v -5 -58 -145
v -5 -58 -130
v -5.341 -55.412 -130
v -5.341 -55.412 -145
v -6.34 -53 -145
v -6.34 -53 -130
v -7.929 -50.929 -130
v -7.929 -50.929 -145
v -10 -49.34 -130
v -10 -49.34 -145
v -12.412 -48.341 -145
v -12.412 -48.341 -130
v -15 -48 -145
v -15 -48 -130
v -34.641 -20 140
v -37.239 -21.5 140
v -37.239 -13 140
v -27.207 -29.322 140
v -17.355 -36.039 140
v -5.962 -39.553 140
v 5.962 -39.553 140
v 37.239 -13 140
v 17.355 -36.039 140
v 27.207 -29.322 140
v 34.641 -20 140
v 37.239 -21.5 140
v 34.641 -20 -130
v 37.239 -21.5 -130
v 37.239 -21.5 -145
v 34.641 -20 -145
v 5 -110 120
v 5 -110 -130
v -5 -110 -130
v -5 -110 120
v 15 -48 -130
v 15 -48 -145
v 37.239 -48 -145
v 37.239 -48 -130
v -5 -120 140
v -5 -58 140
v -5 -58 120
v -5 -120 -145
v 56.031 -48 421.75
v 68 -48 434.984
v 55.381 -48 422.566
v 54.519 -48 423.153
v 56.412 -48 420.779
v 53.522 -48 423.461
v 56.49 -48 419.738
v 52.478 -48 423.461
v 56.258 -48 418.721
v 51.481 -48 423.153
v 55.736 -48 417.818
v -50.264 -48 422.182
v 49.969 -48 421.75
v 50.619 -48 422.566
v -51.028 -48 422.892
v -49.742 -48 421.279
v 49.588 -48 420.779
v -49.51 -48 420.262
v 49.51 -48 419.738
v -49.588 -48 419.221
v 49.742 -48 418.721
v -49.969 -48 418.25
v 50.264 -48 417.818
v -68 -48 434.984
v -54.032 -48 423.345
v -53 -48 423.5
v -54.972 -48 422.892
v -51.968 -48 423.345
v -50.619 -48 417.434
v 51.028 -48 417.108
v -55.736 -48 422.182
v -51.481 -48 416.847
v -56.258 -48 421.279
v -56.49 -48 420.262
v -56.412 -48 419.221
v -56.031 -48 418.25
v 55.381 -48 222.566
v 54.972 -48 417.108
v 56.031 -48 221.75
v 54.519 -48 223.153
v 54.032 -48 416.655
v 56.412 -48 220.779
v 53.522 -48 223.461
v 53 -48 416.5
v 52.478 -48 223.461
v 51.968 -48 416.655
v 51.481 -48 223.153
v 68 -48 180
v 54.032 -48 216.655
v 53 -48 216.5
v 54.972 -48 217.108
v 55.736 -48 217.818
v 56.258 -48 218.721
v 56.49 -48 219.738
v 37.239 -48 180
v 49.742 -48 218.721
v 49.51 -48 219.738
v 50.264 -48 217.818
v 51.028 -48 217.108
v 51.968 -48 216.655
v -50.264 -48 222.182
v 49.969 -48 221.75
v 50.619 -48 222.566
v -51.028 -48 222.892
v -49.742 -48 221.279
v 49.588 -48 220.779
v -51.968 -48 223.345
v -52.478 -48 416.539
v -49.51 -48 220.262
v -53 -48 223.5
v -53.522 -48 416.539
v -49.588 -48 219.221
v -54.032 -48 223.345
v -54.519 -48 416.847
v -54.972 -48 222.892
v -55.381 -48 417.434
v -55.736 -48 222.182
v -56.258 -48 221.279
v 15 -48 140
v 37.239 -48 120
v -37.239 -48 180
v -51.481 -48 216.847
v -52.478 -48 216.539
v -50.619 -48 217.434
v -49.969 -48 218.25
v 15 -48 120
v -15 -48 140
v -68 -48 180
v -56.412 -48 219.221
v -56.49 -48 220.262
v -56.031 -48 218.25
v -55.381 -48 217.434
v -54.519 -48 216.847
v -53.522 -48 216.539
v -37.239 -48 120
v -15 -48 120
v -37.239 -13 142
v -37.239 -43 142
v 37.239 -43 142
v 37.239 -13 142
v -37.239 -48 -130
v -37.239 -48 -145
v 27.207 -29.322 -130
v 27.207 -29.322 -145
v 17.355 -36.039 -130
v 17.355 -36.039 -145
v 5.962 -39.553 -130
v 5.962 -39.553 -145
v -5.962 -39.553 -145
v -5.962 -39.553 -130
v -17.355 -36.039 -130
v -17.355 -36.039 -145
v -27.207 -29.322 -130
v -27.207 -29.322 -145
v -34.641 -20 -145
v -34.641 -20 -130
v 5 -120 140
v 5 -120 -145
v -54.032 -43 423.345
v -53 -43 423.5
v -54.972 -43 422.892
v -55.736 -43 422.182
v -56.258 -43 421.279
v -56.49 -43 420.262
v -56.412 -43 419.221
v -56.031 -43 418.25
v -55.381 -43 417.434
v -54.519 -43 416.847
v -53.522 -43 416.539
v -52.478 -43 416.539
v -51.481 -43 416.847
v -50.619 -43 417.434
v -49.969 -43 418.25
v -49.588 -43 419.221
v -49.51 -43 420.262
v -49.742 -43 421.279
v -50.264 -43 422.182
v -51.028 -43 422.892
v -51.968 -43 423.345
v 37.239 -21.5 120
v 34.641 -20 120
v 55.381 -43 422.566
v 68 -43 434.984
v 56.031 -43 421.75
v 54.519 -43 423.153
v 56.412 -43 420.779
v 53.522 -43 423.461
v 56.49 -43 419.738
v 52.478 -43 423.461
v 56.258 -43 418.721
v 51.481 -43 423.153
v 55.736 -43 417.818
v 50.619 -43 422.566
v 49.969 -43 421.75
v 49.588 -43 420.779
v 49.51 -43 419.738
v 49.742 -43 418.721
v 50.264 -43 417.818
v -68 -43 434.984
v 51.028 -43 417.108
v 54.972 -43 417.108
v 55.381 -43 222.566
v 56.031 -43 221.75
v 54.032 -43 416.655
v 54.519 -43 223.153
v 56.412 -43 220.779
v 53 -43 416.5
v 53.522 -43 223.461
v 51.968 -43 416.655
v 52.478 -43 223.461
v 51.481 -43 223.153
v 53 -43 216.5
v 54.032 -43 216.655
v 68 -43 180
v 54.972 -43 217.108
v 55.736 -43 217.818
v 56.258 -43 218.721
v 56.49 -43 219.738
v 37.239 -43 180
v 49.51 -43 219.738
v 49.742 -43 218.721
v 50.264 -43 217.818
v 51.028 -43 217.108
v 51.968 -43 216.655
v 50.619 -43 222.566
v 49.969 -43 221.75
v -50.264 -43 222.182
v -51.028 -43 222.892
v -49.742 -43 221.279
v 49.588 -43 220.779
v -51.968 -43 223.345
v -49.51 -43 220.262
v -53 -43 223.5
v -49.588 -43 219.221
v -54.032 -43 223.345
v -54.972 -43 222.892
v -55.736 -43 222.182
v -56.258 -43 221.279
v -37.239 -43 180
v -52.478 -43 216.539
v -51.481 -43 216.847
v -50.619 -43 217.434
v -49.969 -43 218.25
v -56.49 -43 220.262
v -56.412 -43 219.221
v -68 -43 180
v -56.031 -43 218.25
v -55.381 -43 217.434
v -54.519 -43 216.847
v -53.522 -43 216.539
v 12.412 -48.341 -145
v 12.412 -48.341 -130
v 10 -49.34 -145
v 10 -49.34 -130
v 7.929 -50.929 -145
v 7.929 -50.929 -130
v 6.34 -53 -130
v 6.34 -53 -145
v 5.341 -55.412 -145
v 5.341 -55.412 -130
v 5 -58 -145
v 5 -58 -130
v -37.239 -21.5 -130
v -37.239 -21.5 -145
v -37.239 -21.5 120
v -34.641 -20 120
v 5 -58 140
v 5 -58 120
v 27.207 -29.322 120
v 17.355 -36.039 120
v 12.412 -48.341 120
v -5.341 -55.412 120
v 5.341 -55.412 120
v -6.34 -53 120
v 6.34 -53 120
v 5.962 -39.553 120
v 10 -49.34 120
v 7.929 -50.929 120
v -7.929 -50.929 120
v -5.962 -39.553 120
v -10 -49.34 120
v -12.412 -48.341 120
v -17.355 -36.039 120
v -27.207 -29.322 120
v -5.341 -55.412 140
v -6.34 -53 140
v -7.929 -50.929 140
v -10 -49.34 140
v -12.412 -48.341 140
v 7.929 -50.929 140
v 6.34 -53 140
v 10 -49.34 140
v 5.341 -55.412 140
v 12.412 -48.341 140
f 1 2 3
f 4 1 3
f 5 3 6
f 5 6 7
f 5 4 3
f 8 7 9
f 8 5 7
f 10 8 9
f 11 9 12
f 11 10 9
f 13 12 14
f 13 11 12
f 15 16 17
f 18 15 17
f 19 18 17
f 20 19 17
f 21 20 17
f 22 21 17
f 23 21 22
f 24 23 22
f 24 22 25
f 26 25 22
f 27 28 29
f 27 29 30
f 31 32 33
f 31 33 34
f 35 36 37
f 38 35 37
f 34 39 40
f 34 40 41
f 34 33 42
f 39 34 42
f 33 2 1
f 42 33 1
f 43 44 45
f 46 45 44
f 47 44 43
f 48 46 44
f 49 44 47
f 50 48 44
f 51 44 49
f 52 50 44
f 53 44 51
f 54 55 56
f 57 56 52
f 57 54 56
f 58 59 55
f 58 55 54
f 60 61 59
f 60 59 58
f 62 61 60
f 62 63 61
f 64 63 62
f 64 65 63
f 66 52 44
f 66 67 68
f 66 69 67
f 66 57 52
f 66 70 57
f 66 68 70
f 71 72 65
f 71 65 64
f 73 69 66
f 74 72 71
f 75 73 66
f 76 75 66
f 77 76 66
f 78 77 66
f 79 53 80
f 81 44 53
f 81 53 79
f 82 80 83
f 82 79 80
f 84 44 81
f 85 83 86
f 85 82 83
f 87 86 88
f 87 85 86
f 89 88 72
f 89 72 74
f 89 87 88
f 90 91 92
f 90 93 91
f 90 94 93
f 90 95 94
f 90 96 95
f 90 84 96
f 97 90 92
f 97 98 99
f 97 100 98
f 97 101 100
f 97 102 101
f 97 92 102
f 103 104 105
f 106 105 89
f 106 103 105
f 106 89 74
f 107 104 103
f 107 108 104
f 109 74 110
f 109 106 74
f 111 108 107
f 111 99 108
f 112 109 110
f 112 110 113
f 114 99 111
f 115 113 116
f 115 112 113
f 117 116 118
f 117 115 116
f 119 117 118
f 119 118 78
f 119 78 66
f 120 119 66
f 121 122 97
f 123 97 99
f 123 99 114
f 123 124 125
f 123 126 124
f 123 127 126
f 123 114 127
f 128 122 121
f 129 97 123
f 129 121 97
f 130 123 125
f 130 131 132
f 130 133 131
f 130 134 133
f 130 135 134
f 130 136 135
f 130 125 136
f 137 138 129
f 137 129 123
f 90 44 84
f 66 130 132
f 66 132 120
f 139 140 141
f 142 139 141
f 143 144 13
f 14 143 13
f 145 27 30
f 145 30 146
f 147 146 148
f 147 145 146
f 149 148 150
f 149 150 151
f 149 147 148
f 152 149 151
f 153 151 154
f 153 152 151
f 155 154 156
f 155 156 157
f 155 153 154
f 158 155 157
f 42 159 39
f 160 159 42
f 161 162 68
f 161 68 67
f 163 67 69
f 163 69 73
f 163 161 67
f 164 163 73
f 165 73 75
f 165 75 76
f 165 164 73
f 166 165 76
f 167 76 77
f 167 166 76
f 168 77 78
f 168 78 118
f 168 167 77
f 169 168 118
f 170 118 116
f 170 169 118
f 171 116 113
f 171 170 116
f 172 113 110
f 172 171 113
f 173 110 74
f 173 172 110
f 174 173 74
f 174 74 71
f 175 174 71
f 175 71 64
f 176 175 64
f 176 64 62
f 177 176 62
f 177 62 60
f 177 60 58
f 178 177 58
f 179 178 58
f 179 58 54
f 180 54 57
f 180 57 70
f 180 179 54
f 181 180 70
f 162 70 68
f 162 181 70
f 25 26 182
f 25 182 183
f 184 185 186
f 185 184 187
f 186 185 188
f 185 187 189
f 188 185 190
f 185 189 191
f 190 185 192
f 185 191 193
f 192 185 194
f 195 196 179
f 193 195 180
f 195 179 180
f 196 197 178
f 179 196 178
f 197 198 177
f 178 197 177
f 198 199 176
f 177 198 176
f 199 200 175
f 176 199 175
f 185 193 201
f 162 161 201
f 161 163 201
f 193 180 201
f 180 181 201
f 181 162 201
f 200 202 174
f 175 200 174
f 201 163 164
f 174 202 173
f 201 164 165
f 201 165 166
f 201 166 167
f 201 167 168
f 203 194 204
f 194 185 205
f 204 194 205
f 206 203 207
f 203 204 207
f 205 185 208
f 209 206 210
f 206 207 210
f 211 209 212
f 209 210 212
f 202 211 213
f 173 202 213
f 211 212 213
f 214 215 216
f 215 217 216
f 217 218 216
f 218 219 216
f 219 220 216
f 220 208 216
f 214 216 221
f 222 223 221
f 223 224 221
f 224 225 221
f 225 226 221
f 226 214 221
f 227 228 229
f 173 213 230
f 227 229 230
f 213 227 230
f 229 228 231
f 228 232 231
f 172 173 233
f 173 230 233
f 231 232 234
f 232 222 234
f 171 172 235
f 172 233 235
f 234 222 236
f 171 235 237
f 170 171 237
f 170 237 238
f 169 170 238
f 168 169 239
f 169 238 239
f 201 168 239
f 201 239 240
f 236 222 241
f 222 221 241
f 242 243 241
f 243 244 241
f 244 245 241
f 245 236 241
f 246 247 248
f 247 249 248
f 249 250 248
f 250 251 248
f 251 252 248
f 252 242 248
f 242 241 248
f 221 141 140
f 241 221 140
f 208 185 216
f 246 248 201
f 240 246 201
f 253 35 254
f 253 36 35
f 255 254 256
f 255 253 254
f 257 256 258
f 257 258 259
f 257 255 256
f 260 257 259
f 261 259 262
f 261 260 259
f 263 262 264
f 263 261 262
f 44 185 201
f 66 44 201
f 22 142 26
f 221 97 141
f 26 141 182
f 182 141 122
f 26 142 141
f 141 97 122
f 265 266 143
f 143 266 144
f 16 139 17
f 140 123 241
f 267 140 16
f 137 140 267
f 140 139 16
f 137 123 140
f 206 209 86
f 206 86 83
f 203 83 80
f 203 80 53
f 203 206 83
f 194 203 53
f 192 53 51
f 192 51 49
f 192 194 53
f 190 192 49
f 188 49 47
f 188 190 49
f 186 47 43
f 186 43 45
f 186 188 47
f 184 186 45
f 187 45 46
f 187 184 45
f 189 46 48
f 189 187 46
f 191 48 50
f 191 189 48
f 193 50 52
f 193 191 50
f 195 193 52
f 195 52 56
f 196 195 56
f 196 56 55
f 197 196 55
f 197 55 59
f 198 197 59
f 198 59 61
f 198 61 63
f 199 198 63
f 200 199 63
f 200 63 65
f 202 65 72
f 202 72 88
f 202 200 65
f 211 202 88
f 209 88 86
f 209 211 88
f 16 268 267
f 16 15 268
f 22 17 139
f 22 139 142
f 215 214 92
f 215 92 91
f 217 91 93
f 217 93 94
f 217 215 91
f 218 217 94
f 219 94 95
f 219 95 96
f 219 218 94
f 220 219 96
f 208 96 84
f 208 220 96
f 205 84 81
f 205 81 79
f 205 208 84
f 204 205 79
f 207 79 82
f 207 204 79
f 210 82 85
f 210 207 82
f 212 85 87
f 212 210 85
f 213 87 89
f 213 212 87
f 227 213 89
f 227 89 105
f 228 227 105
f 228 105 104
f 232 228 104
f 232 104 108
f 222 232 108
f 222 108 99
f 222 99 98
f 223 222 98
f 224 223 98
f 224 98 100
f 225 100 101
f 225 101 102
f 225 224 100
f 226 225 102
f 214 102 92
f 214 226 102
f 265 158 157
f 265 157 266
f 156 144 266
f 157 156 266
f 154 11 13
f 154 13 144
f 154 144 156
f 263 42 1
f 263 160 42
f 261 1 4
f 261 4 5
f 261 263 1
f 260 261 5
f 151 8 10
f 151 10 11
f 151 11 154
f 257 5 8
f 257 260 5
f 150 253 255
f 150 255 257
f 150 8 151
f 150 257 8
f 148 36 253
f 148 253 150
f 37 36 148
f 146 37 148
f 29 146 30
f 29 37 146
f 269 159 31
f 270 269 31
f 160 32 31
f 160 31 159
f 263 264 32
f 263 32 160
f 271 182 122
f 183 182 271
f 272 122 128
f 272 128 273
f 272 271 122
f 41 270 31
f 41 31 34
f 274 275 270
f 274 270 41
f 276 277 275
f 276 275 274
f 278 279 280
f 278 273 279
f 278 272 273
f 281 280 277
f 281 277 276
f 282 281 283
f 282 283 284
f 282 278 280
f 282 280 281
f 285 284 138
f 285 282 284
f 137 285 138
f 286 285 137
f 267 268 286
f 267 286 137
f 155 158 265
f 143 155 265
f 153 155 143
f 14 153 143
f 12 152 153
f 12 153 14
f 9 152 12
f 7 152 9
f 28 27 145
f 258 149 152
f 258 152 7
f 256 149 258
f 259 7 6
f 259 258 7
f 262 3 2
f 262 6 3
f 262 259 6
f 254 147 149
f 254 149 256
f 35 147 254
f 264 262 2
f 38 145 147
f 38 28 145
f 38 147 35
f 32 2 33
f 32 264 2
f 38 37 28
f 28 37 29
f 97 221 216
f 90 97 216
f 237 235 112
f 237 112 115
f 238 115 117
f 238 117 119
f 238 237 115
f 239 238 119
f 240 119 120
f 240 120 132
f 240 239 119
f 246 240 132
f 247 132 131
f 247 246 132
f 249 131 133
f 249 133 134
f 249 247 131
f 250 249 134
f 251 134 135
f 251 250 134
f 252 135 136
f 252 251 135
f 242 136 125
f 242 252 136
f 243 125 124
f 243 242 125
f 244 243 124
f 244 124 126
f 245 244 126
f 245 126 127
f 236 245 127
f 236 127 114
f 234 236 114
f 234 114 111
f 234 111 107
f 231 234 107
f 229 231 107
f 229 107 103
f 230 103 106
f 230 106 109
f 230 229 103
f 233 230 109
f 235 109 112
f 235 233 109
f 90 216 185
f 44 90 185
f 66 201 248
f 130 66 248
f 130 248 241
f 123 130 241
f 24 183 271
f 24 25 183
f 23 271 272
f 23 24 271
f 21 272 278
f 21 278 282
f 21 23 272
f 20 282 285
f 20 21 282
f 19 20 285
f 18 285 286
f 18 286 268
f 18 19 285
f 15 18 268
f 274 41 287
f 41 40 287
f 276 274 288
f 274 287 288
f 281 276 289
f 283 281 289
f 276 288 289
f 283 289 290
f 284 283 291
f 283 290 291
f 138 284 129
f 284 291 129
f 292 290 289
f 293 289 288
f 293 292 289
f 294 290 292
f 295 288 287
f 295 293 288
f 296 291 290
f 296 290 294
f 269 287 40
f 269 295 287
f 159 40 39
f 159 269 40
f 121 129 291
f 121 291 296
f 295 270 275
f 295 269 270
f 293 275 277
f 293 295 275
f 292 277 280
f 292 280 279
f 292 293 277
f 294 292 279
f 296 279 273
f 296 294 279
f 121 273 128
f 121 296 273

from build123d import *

# Parameters (mm, degrees)
EXTRUDE_START    = 130
EXTRUDE_1_DEPTH  = 10
EXTRUDE_START_2  = -130
EXTRUDE_2_DEPTH  = 15
SKETCH_2_R       = 3.5
EXTRUDE_5_DEPTH  = 5
EXTRUDE_START_3  = -20
EXTRUDE_11_DEPTH = 20
EXTRUDE_15_DEPTH = 15
EXTRUDE_16_DEPTH = 5
FILLET_1_R       = 10
SKETCH_9_W       = 74.478184726
SKETCH_9_H       = 2
EXTRUDE_17_DEPTH = 30


with BuildPart() as part:
    # 草图1 → 凸台-拉伸1 (new, symmetric)
    with BuildSketch(Plane.XY.offset(EXTRUDE_START)):
        with BuildLine():
            Line((-34.641016151, -20), (-37.239092363, -21.5))
            ThreePointArc((-37.239092363, -21.5), (0, -43), (37.239092363, -21.5))
            Line((37.239092363, -21.5), (34.641016151, -20))
            ThreePointArc((34.641016151, -20), (0, -40), (-34.641016151, -20))
        make_face()
    extrude(amount=EXTRUDE_1_DEPTH, both=True)



with BuildPart() as body_2:
    # 草图1<2> → 凸台-拉伸2 (new body)
    with BuildSketch(Plane.XY.offset(EXTRUDE_START_2)):
        with BuildLine():
            Line((-34.641016151, -20), (-37.239092363, -21.5))
            ThreePointArc((-37.239092363, -21.5), (0, -43), (37.239092363, -21.5))
            Line((37.239092363, -21.5), (34.641016151, -20))
            ThreePointArc((34.641016151, -20), (0, -40), (-34.641016151, -20))
        make_face()
    extrude(amount=-EXTRUDE_2_DEPTH)

    # 草图7 → 凸台-拉伸15 (add)
    with BuildSketch(Plane(origin=(0, 0, -145), x_dir=(-1, 0, 0), z_dir=(0, 0, -1))):
        with BuildLine():
            Line((37.239092363, -21.5), (37.239092363, -48))
            Line((37.239092363, -48), (-37.239092363, -48))
            Line((-37.239092363, -48), (-37.239092363, -21.5))
            ThreePointArc((-37.239092363, -21.5), (0, -43), (37.239092363, -21.5))
        make_face()
    extrude(amount=-EXTRUDE_15_DEPTH)


with BuildPart() as body_3:
    # 草图2 → 凸台-拉伸5 (new body)
    with BuildSketch(Plane(origin=(0, -43, 0), x_dir=(-1, 0, 0), z_dir=(0, -1, 0))):
        Polygon((-37.239092363, -180), (-68, -180), (-68, -434.984182396), (68, -434.984182396), (68, -180), (37.239092363, -180), (37.239092363, -120), (-37.239092363, -120), align=None)
        with Locations(Location((-53, -220, 0), (0, 0, 90))):
            Circle(SKETCH_2_R, mode=Mode.SUBTRACT)
        with Locations(Location((-53, -420, 0), (0, 0, 90))):
            Circle(SKETCH_2_R, mode=Mode.SUBTRACT)
        with Locations(Location((53, -420, 0), (0, 0, 270))):
            Circle(SKETCH_2_R, mode=Mode.SUBTRACT)
        with Locations(Location((53, -220, 0), (0, 0, 270))):
            Circle(SKETCH_2_R, mode=Mode.SUBTRACT)
    extrude(amount=EXTRUDE_5_DEPTH)


with BuildPart() as part_1:
    add(part.part)

    add(body_3.part)  # 凸台-拉伸11 merges body 3
    # 草图5 → 凸台-拉伸11 (add)
    with BuildSketch(Plane(origin=(0, 0, 120), x_dir=(-1, 0, 0), z_dir=(0, 0, -1)).offset(EXTRUDE_START_3)):
        with BuildLine():
            Line((-37.239092363, -21.5), (-37.239092363, -48))
            Line((-37.239092363, -48), (37.239092363, -48))
            Line((37.239092363, -48), (37.239092363, -21.5))
            ThreePointArc((37.239092363, -21.5), (0, -43), (-37.239092363, -21.5))
        make_face()
    extrude(amount=EXTRUDE_11_DEPTH)


    add(body_2.part)  # 凸台-拉伸16 merges body 2
    # 草图8 → 凸台-拉伸16 (add, symmetric)
    with BuildSketch(Plane(origin=(0, 0, 0), x_dir=(0, 0, -1), z_dir=(1, 0, 0))):
        Polygon((-140, -43), (-140, -120), (145, -120), (145, -43), (130, -43), (130, -48), (130, -110), (-120, -110), (-120, -48), (-120, -43), align=None)
    extrude(amount=EXTRUDE_16_DEPTH, both=True)

    # 圆角1
    fillet_1_edges = [part_1.edges().sort_by_distance(p)[0] for p in [
        (-5, -48, 130),
        (5, -48, 130),
        (-5, -48, -137.5),
        (5, -48, -137.5),
    ]]
    fillet(fillet_1_edges, radius=FILLET_1_R)

    # 草图9 → 凸台-拉伸17 (add)
    with BuildSketch(Plane(origin=(0, -43, 0), x_dir=(1, 0, 0), z_dir=(0, 1, 0))):
        with Locations((0, -141)):
            Rectangle(SKETCH_9_W, SKETCH_9_H)
    extrude(amount=EXTRUDE_17_DEPTH)


solid = part_1.part
